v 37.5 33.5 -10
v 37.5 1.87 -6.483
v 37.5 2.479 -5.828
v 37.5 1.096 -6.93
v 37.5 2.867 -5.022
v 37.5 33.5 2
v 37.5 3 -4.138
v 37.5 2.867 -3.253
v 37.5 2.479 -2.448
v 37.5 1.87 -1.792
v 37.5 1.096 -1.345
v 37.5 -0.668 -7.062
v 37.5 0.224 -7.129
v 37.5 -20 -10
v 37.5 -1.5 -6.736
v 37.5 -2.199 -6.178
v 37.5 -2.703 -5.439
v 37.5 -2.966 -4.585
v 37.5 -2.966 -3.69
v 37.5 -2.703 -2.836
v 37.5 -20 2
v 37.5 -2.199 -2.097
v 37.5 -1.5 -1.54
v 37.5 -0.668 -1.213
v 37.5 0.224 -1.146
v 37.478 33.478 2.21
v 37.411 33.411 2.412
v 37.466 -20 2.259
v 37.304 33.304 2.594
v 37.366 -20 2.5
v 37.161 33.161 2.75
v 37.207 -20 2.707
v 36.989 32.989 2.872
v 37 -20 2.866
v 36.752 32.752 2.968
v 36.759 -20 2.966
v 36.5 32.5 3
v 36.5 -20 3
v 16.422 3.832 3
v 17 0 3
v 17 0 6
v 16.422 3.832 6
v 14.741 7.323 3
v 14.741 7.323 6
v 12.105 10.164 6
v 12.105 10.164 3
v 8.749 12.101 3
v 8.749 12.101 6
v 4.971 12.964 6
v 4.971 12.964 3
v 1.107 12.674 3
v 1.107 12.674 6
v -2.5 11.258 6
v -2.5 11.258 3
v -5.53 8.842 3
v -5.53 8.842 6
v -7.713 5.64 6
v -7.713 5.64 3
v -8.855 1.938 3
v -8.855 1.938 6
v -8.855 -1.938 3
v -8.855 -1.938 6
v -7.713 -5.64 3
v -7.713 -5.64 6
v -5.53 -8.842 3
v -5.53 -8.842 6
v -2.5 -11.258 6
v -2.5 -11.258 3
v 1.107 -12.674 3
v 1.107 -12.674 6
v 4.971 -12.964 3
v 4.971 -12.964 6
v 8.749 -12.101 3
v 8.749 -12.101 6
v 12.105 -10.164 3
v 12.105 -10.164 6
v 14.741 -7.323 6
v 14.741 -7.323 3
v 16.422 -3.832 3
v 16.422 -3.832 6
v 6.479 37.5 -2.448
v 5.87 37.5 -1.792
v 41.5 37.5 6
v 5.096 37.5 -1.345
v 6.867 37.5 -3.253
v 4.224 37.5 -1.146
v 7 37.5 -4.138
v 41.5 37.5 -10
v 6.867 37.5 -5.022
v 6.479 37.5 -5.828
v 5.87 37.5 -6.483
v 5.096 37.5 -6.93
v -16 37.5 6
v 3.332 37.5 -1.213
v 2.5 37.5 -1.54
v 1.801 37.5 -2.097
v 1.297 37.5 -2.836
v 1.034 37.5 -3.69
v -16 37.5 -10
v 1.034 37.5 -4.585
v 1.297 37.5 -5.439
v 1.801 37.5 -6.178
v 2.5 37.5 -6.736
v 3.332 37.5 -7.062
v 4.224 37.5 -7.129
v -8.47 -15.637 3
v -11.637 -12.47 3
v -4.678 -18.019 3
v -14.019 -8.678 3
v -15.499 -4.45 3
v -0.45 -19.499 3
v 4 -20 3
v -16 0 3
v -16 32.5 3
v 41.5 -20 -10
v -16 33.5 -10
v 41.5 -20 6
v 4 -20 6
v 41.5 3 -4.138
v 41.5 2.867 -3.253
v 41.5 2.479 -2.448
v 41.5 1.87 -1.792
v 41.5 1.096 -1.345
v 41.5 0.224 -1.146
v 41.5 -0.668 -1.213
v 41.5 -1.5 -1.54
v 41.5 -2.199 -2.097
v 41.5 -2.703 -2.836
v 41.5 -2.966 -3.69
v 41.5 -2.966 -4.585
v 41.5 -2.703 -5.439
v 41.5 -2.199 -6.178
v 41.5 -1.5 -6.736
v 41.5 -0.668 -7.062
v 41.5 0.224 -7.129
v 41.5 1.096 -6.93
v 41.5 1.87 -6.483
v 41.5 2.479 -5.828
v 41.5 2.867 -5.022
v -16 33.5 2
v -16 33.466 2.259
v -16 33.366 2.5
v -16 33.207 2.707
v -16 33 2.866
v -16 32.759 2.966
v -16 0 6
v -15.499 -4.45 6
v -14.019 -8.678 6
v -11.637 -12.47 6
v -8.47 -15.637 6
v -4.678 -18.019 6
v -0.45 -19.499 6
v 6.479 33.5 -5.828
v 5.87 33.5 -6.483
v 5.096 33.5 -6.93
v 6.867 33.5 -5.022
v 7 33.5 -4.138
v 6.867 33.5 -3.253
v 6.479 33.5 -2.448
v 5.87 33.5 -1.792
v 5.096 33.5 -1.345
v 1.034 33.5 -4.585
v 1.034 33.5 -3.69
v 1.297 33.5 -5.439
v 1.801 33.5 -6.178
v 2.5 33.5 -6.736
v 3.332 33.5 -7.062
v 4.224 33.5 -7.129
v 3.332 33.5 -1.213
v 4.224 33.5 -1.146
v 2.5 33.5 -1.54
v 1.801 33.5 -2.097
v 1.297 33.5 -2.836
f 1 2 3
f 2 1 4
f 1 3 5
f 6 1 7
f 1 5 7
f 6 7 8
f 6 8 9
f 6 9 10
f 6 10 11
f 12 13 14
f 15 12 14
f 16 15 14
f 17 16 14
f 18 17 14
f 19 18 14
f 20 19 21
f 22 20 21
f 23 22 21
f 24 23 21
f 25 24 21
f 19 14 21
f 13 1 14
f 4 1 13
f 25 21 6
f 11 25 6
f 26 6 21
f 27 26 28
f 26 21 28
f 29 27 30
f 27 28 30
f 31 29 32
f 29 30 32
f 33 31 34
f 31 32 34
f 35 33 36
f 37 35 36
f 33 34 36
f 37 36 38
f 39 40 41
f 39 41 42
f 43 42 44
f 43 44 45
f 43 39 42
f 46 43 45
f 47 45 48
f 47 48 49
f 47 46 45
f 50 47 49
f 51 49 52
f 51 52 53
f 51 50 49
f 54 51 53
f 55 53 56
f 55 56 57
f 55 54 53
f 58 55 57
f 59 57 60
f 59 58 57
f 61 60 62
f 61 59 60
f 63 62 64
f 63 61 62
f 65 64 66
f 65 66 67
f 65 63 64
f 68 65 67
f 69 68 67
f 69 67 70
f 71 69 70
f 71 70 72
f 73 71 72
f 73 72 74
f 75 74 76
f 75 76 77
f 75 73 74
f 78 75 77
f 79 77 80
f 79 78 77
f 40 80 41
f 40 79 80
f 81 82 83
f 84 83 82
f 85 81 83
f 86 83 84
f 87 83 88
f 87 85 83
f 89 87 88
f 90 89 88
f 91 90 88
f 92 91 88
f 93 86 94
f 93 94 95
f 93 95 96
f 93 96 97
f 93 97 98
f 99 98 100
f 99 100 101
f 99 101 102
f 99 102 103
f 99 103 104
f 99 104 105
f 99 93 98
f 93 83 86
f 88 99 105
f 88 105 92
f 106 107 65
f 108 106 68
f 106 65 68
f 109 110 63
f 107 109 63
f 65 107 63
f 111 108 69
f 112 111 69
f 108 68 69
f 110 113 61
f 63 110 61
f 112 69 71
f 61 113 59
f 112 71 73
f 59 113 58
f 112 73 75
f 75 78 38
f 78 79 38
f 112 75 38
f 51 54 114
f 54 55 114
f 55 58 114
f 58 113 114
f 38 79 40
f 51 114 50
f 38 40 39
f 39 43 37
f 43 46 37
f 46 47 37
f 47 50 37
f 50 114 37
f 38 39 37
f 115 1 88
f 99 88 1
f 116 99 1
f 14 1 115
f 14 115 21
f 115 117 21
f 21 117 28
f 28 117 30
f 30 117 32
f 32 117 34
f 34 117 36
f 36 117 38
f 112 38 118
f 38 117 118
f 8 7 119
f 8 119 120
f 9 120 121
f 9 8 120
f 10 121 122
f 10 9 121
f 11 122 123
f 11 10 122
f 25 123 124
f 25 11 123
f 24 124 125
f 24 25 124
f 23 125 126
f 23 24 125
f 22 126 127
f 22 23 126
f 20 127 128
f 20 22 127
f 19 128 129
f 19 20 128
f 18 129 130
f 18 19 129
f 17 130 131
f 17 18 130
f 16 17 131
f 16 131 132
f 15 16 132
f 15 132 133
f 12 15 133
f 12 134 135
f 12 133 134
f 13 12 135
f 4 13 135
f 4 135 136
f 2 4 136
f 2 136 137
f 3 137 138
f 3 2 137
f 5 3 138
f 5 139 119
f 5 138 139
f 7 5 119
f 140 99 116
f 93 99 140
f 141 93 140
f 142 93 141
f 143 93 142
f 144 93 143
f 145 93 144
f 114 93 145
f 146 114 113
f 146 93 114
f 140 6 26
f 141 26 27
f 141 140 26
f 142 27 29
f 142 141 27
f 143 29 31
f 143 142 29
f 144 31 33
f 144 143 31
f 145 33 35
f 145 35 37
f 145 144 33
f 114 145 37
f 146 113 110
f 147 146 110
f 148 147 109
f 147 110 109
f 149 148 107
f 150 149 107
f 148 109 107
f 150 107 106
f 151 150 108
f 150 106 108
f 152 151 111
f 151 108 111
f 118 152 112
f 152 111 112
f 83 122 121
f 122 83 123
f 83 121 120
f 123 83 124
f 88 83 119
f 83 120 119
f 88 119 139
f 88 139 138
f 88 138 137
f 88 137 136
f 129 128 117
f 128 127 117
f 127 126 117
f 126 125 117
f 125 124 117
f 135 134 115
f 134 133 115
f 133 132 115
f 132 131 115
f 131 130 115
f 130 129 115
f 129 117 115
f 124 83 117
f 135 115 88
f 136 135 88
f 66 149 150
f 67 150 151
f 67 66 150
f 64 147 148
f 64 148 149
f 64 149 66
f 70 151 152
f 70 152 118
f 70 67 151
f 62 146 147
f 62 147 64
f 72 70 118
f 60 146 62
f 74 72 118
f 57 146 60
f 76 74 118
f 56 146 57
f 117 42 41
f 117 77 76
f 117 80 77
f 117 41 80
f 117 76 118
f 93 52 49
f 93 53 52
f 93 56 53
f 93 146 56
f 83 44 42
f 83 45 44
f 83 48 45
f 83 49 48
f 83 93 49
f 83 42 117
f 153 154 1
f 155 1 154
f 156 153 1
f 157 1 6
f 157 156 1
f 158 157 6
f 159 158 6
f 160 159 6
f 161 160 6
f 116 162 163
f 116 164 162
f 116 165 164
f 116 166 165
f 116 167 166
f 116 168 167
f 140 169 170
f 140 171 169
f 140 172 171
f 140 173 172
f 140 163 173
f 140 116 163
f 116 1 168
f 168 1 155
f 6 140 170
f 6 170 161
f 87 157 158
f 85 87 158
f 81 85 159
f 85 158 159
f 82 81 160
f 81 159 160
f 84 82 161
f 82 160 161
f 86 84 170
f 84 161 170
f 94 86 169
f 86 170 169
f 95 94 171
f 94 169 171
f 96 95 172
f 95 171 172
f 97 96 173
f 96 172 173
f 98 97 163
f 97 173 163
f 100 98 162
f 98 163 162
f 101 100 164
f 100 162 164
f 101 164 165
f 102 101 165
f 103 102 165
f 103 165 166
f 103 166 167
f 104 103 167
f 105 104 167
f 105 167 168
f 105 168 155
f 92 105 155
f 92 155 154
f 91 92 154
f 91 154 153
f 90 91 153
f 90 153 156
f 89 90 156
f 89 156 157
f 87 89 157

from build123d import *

# Parameters (mm, degrees)
SKETCH007_R     = 13
PAD003_DEPTH    = 3
PAD004_DEPTH    = 57.5
PAD005_DEPTH    = 57.5
SKETCH010_R     = 3
POCKET002_DEPTH = 37.501
SKETCH011_R     = 3
POCKET003_DEPTH = 37.501


with BuildPart() as part:
    # Sketch007 → Pad003 (new body)
    with BuildSketch(Plane.XY.offset(3)):
        with BuildLine():
            ThreePointArc((-20, 0), (-14.142136, -14.142136), (0, -20))
            Line((37.5, -20), (0, -20))
            Line((37.5, 37.5), (37.5, -20))
            Line((0, 37.5), (37.5, 37.5))
            Line((0, 37.5), (-20, 37.5))
            Line((-20, 37.5), (-20, 0))
        make_face()
        Circle(SKETCH007_R, mode=Mode.SUBTRACT)
    extrude(amount=PAD003_DEPTH)

    # Sketch008 → Pad004 (join)
    with BuildSketch(Plane.XZ.offset(20)):
        with BuildLine():
            Line((32.5, 3), (37.5, 3))
            Line((37.5, 3), (37.5, -10))
            Line((37.5, -10), (33.5, -10))
            Line((33.5, -10), (33.5, 2))
            ThreePointArc((33.5, 2), (33.207107, 2.707107), (32.5, 3))
        make_face()
    extrude(amount=-PAD004_DEPTH)

    # Sketch009 → Pad005 (join)
    with BuildSketch(Plane.YZ.offset(-20)):
        with BuildLine():
            Line((32.5, 3), (37.5, 3))
            Line((37.5, 3), (37.5, -10))
            Line((37.5, -10), (33.5, -10))
            Line((33.5, -10), (33.5, 2))
            ThreePointArc((33.5, 2), (33.207107, 2.707107), (32.5, 3))
        make_face()
    extrude(amount=PAD005_DEPTH)

    # Sketch010 → Pocket002 (cut, through all)
    with BuildSketch(Plane.YZ):
        with Locations((0, -4.137609)):
            Circle(SKETCH010_R)
    extrude(amount=POCKET002_DEPTH, mode=Mode.SUBTRACT)

    # Sketch011 → Pocket003 (cut, through all)
    with BuildSketch(Plane.XZ):
        with Locations((0, -4.137609)):
            Circle(SKETCH011_R)
    extrude(amount=-POCKET003_DEPTH, mode=Mode.SUBTRACT)


with BuildPart() as part_1:
    # Body001 placement: moved
    add(part.part.moved(Location((4, 0, 0))))


solid = part_1.part
